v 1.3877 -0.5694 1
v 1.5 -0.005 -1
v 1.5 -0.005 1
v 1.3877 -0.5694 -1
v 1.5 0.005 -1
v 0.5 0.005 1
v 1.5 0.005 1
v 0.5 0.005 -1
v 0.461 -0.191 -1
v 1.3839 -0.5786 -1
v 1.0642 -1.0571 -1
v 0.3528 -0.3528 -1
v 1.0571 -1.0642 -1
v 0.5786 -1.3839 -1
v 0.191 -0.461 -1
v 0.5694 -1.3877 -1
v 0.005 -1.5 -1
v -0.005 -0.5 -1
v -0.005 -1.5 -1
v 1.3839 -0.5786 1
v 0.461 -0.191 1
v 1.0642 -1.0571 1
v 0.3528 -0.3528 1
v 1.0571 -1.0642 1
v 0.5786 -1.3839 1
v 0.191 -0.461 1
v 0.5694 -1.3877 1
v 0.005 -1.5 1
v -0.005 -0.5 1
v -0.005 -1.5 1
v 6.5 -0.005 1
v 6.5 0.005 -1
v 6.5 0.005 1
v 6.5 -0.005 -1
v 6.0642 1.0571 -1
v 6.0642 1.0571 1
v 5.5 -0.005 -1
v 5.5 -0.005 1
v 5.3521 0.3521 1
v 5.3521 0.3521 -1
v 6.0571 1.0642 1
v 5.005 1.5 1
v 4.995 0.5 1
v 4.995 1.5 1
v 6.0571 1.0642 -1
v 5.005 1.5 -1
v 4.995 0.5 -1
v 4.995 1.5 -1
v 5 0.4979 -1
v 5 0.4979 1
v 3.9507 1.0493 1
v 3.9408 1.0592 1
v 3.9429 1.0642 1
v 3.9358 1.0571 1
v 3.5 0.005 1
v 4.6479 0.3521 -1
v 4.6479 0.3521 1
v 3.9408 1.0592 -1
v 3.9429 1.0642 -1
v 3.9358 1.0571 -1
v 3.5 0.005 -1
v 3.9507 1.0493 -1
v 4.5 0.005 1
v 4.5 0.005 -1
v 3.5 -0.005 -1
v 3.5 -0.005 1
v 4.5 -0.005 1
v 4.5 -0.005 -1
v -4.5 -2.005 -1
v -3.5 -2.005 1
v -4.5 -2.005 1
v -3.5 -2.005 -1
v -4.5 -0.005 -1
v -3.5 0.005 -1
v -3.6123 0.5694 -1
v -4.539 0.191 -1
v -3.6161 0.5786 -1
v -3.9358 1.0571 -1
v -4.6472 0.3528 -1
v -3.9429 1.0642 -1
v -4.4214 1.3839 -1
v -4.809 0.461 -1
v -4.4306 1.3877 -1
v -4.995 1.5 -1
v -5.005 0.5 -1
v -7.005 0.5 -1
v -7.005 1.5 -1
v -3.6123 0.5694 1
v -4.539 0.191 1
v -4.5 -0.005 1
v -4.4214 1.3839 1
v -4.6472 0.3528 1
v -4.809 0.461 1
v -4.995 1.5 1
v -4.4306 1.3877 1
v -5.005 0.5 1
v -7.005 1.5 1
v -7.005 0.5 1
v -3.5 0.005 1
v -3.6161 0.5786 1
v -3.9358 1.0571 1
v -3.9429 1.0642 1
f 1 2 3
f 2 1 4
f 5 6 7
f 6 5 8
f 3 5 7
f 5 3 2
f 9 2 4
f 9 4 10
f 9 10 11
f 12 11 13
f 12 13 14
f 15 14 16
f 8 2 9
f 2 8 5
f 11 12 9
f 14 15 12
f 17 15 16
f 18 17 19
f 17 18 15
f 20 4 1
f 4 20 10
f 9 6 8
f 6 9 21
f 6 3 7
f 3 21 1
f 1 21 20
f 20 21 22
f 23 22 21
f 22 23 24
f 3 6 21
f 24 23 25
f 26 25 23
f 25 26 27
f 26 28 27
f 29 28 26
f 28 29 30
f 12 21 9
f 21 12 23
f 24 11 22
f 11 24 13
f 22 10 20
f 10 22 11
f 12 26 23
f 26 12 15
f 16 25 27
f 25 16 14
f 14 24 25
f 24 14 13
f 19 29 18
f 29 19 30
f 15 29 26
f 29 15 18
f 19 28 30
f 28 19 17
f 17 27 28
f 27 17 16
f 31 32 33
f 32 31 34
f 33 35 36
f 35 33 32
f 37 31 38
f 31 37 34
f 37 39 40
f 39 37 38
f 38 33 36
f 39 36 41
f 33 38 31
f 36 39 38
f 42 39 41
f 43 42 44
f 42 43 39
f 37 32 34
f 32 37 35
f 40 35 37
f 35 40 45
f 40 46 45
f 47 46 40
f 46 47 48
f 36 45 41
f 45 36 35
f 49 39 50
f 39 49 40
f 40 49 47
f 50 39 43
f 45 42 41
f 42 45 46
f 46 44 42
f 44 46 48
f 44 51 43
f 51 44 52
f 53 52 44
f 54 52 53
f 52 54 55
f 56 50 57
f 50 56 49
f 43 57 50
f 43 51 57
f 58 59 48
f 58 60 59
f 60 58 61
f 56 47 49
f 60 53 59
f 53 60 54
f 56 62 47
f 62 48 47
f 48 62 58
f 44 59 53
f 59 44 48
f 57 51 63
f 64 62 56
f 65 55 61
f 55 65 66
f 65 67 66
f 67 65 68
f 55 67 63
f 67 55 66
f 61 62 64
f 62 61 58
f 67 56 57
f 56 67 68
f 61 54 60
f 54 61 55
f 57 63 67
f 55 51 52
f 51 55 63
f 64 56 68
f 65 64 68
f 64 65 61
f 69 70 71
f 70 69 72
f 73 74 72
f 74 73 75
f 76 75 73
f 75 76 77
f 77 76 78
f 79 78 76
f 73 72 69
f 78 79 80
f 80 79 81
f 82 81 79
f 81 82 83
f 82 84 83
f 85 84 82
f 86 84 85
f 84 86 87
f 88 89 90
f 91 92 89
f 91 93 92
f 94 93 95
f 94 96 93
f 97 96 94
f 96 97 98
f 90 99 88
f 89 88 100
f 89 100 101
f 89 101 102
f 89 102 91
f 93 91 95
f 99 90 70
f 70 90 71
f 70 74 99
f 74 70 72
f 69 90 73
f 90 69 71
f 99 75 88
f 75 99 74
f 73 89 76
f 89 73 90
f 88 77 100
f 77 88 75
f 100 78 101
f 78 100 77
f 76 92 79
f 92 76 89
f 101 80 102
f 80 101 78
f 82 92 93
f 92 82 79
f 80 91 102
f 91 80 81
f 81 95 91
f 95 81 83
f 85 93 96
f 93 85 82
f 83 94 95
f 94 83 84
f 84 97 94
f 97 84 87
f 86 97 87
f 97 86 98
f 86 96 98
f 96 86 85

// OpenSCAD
// file: polychannel.scad
/*--------------------------------------------------------------------------------------
/ General purpose multi-segment channel module: polychannel.
/
/ Given a list of sizes and positions, a series of connected channels is constructed
/ using the hull() operation to connect sequential pairs of cubes with specified
/ size and position as given in the sizes and positions list.
/
/ Rev. 1, 9/28/22, by G. Nordin - Initial version
/ Rev. 1.5, 9/29/22, by Dallin Miner - Modify to select sphere as well as cube shapes
/ Rev. 2, 10/1/22, by G. Nordin - Generalize to include rotation of shapes
--------------------------------------------------------------------------------------*/
$fn=50;

echo();
echo();

// Convert data structure from relative to absolute positions.

// Function to add list of vectors. See add2() at 
// https://en.wikibooks.org/wiki/OpenSCAD_User_Manual/Tips_and_Tricks#Add_all_values_in_a_list
function add_list_of_vecs(v) = [for(i=v) 1]*v;
function extract_rel_pos_vectors(p, n, pos_index=2) = [
    for (i=[0:1:n]) p[i][pos_index]
];
function pos_rel_to_abs_oneline(p, line_index) = [
    p[line_index][0],
    p[line_index][1],
    add_list_of_vecs(extract_rel_pos_vectors(p, line_index)),
    p[line_index][3]
];
function convert_params_rel_to_abs(p) = [
    for (i=[0:1:len(p)-1]) pos_rel_to_abs_oneline(p, i)
];





// Fundamental shape creation module for polychannel module.
module shape3D(shape, size, position, rotation, center=true) {
    a = rotation[0];
    v = rotation[1];
    if(shape=="cube"){
        translate(position) rotate(a=a, v=v) cube(size, center=center);
    }
    else if(shape=="sphr" || shape=="sphere"){
        translate(position) rotate(a=a, v=v)  scale(size) sphere(d=1);
    }
    else {
        assert(false, "invalid shape");
    }
}

module polychannel_absolute_positions(params, clr="lightblue", center=true, show_only_shapes=false) {
    // echo("len(params)", len(params));
    // echo("params", params);
    if (show_only_shapes) {
        for (i = [0:1:len(params)-1]) {
            // echo("shapes only", i, params[i]);
            color(clr) shape3D(params[i][0], params[i][1], params[i][2], params[i][3], center=center);
        }
    } else {
        for (i = [1:1:len(params)-1]) {
            // echo("with hull", i, params[i-1], params[i]);
            color(clr) hull() {
                shape3D(params[i-1][0], params[i-1][1], params[i-1][2], params[i-1][3], center=center);
                shape3D(params[i][0], params[i][1], params[i][2], params[i][3], center=center);
            };
        };
    }
}

module polychannel(params, relative_positions=false, clr="lightblue", center=true, show_only_shapes=false) {
    if (relative_positions) {
        params_abs = convert_params_rel_to_abs(params);
        polychannel_absolute_positions(params_abs, clr=clr, center=center, show_only_shapes=show_only_shapes);
    } else {
        polychannel_absolute_positions(params, clr=clr, center=center, show_only_shapes=show_only_shapes);
    }
}

// Test data
eps = 0.01;
params_pos_absolute = [
    ["sphr", [eps, 4, 4], [0, 0, 0], [0, [0, 0, 1]]],
    ["sphr", [eps, 4, 4], [7, 0, 0], [0, [0, 0, 1]]],
    ["cube", [eps, 1, 1], [7, 0, 0], [0, [0, 0, 1]]],
    ["cube", [eps, 1*sqrt(2), 1], [10, 0, 0], [45, [0, 0, 1]]],
    ["cube", [eps, 1, 1], [10, 2, 0], [90, [0, 0, 1]]],
    ["cube", [3, 2, 3], [10, 5, 0], [0, [0, 0, 1]]],
    ["cube", [1, eps, 1], [10, 7, 0], [0, [0, 0, 1]]],
    ["sphr", [eps, 1*sqrt(2), 1], [10, 8, 0], [45, [0, 0, 1]]],
    ["sphr", [eps, 2, 2], [15, 8, 0], [0, [0, 0, 1]]],
    ["sphr", [2, 2, 2], [17, 8, 0], [0, [0, 0, 1]]],
    ["sphr", [2, 2, 2], [17, 4, 4], [0, [0, 0, 1]]],
    ["cube", [1, 1, 2], [17, 2, 4], [0, [0, 0, 1]]]
];
params_pos_relative = [
    ["sphr", [eps, 4, 4], [0, 0, 0], [0, [0, 0, 1]]],
    ["sphr", [eps, 4, 4], [7, 0, 0], [0, [0, 0, 1]]],
    ["cube", [eps, 1, 1], [0, 0, 0], [0, [0, 0, 1]]],
    ["cube", [eps, 1*sqrt(2), 1], [3, 0, 0], [45, [0, 0, 1]]],
    ["cube", [eps, 1, 1], [0, 2, 0], [90, [0, 0, 1]]],
    ["cube", [3, 2, 3], [0, 3, 0], [0, [0, 0, 1]]],
    ["cube", [1, eps, 1], [0, 2, 0], [0, [0, 0, 1]]],
    ["sphr", [eps, 1*sqrt(2), 1], [0, 2, 0], [45, [0, 0, 1]]],
    ["sphr", [eps, 2, 2], [5, 0, 0], [0, [0, 0, 1]]],
    ["sphr", [2, 2, 2], [2, 0, 0], [0, [0, 0, 1]]],
    ["sphr", [2, 2, 2], [0, -4, 4], [0, [0, 0, 1]]],
    ["cube", [1, 1, 2], [0, -2, 0], [0, [0, 0, 1]]]
];


polychannel(params_pos_relative, relative_positions=true, clr="red", show_only_shapes=true);

translate([0, -25, 0]) polychannel(params_pos_absolute, clr="Salmon");

translate([0, 25, 0]) polychannel(params_pos_relative, relative_positions=true);
// main file
use <polychannel.scad>

// Circular arc functions to calculate absolute and relative positions along an arc
// n is the number of segments in arc, so number of points in arc is n+1
function calc_arc_pos_i(radius, angle1, angle2, n, i) = [
    radius*cos(angle1 + i*(angle2-angle1)/n), 
    radius*sin(angle1 + i*(angle2-angle1)/n),
    0
];
function calc_arc_rot_i(angle1, angle2, n, i) = [
    angle1 + i*(angle2-angle1)/n, 
    [0, 0, 1]
];
function arc_pos_rot_oneline(shape, size, radius, angle1, angle2, n, i) = [
    shape, size, calc_arc_pos_i(radius, angle1, angle2, n, i), calc_arc_rot_i(angle1, angle2, n, i)
];
function arc_abs_position(shape, size, radius, angle1, angle2, n) = [
    for (i=[0:1:n]) arc_pos_rot_oneline(shape, size, radius, angle1, angle2, n, i)
];

echo();
temp_n = 4;
temp_angle1 = 0;
temp_angle2 = -90;
temp_radius = 1;
for (i=[0:1:temp_n])
    echo(
        i, calc_arc_pos_i(temp_radius, temp_angle1, temp_angle2, temp_n, i), 
        calc_arc_rot_i(temp_angle1, temp_angle2, temp_n, i),
        arc_pos_rot_oneline("cube", [1, 0.01, 2], temp_radius, temp_angle1, temp_angle2, temp_n, i)
        );
echo();

params_pos_absolute = arc_abs_position("cube", [1, 0.01, 2], temp_radius, temp_angle1, temp_angle2, temp_n);
echo(params_pos_absolute);
echo();

polychannel(params_pos_absolute);

// translate([5, 0, 0]) polychannel("cube", [1, 0.01, 2], temp_radius, 0, 90, temp_n);
translate([5, 0, 0]) polychannel(arc_abs_position("cube", [1, 0.01, 2], temp_radius, temp_angle1, 180, temp_n));

test_params_pos_absolute = [
    ["cube", [1, 0.01, 2], [temp_radius, -2, 0], [0, [0, 0, 1]]],
    each arc_abs_position("cube", [1, 0.01, 2], temp_radius, temp_angle1, 90, temp_n),
    ["cube", [0.01, 1, 2], [-2, temp_radius, 0], [0, [0, 0, 1]]]
];
echo(test_params_pos_absolute);

translate([-5, 0, 0]) polychannel(test_params_pos_absolute);
